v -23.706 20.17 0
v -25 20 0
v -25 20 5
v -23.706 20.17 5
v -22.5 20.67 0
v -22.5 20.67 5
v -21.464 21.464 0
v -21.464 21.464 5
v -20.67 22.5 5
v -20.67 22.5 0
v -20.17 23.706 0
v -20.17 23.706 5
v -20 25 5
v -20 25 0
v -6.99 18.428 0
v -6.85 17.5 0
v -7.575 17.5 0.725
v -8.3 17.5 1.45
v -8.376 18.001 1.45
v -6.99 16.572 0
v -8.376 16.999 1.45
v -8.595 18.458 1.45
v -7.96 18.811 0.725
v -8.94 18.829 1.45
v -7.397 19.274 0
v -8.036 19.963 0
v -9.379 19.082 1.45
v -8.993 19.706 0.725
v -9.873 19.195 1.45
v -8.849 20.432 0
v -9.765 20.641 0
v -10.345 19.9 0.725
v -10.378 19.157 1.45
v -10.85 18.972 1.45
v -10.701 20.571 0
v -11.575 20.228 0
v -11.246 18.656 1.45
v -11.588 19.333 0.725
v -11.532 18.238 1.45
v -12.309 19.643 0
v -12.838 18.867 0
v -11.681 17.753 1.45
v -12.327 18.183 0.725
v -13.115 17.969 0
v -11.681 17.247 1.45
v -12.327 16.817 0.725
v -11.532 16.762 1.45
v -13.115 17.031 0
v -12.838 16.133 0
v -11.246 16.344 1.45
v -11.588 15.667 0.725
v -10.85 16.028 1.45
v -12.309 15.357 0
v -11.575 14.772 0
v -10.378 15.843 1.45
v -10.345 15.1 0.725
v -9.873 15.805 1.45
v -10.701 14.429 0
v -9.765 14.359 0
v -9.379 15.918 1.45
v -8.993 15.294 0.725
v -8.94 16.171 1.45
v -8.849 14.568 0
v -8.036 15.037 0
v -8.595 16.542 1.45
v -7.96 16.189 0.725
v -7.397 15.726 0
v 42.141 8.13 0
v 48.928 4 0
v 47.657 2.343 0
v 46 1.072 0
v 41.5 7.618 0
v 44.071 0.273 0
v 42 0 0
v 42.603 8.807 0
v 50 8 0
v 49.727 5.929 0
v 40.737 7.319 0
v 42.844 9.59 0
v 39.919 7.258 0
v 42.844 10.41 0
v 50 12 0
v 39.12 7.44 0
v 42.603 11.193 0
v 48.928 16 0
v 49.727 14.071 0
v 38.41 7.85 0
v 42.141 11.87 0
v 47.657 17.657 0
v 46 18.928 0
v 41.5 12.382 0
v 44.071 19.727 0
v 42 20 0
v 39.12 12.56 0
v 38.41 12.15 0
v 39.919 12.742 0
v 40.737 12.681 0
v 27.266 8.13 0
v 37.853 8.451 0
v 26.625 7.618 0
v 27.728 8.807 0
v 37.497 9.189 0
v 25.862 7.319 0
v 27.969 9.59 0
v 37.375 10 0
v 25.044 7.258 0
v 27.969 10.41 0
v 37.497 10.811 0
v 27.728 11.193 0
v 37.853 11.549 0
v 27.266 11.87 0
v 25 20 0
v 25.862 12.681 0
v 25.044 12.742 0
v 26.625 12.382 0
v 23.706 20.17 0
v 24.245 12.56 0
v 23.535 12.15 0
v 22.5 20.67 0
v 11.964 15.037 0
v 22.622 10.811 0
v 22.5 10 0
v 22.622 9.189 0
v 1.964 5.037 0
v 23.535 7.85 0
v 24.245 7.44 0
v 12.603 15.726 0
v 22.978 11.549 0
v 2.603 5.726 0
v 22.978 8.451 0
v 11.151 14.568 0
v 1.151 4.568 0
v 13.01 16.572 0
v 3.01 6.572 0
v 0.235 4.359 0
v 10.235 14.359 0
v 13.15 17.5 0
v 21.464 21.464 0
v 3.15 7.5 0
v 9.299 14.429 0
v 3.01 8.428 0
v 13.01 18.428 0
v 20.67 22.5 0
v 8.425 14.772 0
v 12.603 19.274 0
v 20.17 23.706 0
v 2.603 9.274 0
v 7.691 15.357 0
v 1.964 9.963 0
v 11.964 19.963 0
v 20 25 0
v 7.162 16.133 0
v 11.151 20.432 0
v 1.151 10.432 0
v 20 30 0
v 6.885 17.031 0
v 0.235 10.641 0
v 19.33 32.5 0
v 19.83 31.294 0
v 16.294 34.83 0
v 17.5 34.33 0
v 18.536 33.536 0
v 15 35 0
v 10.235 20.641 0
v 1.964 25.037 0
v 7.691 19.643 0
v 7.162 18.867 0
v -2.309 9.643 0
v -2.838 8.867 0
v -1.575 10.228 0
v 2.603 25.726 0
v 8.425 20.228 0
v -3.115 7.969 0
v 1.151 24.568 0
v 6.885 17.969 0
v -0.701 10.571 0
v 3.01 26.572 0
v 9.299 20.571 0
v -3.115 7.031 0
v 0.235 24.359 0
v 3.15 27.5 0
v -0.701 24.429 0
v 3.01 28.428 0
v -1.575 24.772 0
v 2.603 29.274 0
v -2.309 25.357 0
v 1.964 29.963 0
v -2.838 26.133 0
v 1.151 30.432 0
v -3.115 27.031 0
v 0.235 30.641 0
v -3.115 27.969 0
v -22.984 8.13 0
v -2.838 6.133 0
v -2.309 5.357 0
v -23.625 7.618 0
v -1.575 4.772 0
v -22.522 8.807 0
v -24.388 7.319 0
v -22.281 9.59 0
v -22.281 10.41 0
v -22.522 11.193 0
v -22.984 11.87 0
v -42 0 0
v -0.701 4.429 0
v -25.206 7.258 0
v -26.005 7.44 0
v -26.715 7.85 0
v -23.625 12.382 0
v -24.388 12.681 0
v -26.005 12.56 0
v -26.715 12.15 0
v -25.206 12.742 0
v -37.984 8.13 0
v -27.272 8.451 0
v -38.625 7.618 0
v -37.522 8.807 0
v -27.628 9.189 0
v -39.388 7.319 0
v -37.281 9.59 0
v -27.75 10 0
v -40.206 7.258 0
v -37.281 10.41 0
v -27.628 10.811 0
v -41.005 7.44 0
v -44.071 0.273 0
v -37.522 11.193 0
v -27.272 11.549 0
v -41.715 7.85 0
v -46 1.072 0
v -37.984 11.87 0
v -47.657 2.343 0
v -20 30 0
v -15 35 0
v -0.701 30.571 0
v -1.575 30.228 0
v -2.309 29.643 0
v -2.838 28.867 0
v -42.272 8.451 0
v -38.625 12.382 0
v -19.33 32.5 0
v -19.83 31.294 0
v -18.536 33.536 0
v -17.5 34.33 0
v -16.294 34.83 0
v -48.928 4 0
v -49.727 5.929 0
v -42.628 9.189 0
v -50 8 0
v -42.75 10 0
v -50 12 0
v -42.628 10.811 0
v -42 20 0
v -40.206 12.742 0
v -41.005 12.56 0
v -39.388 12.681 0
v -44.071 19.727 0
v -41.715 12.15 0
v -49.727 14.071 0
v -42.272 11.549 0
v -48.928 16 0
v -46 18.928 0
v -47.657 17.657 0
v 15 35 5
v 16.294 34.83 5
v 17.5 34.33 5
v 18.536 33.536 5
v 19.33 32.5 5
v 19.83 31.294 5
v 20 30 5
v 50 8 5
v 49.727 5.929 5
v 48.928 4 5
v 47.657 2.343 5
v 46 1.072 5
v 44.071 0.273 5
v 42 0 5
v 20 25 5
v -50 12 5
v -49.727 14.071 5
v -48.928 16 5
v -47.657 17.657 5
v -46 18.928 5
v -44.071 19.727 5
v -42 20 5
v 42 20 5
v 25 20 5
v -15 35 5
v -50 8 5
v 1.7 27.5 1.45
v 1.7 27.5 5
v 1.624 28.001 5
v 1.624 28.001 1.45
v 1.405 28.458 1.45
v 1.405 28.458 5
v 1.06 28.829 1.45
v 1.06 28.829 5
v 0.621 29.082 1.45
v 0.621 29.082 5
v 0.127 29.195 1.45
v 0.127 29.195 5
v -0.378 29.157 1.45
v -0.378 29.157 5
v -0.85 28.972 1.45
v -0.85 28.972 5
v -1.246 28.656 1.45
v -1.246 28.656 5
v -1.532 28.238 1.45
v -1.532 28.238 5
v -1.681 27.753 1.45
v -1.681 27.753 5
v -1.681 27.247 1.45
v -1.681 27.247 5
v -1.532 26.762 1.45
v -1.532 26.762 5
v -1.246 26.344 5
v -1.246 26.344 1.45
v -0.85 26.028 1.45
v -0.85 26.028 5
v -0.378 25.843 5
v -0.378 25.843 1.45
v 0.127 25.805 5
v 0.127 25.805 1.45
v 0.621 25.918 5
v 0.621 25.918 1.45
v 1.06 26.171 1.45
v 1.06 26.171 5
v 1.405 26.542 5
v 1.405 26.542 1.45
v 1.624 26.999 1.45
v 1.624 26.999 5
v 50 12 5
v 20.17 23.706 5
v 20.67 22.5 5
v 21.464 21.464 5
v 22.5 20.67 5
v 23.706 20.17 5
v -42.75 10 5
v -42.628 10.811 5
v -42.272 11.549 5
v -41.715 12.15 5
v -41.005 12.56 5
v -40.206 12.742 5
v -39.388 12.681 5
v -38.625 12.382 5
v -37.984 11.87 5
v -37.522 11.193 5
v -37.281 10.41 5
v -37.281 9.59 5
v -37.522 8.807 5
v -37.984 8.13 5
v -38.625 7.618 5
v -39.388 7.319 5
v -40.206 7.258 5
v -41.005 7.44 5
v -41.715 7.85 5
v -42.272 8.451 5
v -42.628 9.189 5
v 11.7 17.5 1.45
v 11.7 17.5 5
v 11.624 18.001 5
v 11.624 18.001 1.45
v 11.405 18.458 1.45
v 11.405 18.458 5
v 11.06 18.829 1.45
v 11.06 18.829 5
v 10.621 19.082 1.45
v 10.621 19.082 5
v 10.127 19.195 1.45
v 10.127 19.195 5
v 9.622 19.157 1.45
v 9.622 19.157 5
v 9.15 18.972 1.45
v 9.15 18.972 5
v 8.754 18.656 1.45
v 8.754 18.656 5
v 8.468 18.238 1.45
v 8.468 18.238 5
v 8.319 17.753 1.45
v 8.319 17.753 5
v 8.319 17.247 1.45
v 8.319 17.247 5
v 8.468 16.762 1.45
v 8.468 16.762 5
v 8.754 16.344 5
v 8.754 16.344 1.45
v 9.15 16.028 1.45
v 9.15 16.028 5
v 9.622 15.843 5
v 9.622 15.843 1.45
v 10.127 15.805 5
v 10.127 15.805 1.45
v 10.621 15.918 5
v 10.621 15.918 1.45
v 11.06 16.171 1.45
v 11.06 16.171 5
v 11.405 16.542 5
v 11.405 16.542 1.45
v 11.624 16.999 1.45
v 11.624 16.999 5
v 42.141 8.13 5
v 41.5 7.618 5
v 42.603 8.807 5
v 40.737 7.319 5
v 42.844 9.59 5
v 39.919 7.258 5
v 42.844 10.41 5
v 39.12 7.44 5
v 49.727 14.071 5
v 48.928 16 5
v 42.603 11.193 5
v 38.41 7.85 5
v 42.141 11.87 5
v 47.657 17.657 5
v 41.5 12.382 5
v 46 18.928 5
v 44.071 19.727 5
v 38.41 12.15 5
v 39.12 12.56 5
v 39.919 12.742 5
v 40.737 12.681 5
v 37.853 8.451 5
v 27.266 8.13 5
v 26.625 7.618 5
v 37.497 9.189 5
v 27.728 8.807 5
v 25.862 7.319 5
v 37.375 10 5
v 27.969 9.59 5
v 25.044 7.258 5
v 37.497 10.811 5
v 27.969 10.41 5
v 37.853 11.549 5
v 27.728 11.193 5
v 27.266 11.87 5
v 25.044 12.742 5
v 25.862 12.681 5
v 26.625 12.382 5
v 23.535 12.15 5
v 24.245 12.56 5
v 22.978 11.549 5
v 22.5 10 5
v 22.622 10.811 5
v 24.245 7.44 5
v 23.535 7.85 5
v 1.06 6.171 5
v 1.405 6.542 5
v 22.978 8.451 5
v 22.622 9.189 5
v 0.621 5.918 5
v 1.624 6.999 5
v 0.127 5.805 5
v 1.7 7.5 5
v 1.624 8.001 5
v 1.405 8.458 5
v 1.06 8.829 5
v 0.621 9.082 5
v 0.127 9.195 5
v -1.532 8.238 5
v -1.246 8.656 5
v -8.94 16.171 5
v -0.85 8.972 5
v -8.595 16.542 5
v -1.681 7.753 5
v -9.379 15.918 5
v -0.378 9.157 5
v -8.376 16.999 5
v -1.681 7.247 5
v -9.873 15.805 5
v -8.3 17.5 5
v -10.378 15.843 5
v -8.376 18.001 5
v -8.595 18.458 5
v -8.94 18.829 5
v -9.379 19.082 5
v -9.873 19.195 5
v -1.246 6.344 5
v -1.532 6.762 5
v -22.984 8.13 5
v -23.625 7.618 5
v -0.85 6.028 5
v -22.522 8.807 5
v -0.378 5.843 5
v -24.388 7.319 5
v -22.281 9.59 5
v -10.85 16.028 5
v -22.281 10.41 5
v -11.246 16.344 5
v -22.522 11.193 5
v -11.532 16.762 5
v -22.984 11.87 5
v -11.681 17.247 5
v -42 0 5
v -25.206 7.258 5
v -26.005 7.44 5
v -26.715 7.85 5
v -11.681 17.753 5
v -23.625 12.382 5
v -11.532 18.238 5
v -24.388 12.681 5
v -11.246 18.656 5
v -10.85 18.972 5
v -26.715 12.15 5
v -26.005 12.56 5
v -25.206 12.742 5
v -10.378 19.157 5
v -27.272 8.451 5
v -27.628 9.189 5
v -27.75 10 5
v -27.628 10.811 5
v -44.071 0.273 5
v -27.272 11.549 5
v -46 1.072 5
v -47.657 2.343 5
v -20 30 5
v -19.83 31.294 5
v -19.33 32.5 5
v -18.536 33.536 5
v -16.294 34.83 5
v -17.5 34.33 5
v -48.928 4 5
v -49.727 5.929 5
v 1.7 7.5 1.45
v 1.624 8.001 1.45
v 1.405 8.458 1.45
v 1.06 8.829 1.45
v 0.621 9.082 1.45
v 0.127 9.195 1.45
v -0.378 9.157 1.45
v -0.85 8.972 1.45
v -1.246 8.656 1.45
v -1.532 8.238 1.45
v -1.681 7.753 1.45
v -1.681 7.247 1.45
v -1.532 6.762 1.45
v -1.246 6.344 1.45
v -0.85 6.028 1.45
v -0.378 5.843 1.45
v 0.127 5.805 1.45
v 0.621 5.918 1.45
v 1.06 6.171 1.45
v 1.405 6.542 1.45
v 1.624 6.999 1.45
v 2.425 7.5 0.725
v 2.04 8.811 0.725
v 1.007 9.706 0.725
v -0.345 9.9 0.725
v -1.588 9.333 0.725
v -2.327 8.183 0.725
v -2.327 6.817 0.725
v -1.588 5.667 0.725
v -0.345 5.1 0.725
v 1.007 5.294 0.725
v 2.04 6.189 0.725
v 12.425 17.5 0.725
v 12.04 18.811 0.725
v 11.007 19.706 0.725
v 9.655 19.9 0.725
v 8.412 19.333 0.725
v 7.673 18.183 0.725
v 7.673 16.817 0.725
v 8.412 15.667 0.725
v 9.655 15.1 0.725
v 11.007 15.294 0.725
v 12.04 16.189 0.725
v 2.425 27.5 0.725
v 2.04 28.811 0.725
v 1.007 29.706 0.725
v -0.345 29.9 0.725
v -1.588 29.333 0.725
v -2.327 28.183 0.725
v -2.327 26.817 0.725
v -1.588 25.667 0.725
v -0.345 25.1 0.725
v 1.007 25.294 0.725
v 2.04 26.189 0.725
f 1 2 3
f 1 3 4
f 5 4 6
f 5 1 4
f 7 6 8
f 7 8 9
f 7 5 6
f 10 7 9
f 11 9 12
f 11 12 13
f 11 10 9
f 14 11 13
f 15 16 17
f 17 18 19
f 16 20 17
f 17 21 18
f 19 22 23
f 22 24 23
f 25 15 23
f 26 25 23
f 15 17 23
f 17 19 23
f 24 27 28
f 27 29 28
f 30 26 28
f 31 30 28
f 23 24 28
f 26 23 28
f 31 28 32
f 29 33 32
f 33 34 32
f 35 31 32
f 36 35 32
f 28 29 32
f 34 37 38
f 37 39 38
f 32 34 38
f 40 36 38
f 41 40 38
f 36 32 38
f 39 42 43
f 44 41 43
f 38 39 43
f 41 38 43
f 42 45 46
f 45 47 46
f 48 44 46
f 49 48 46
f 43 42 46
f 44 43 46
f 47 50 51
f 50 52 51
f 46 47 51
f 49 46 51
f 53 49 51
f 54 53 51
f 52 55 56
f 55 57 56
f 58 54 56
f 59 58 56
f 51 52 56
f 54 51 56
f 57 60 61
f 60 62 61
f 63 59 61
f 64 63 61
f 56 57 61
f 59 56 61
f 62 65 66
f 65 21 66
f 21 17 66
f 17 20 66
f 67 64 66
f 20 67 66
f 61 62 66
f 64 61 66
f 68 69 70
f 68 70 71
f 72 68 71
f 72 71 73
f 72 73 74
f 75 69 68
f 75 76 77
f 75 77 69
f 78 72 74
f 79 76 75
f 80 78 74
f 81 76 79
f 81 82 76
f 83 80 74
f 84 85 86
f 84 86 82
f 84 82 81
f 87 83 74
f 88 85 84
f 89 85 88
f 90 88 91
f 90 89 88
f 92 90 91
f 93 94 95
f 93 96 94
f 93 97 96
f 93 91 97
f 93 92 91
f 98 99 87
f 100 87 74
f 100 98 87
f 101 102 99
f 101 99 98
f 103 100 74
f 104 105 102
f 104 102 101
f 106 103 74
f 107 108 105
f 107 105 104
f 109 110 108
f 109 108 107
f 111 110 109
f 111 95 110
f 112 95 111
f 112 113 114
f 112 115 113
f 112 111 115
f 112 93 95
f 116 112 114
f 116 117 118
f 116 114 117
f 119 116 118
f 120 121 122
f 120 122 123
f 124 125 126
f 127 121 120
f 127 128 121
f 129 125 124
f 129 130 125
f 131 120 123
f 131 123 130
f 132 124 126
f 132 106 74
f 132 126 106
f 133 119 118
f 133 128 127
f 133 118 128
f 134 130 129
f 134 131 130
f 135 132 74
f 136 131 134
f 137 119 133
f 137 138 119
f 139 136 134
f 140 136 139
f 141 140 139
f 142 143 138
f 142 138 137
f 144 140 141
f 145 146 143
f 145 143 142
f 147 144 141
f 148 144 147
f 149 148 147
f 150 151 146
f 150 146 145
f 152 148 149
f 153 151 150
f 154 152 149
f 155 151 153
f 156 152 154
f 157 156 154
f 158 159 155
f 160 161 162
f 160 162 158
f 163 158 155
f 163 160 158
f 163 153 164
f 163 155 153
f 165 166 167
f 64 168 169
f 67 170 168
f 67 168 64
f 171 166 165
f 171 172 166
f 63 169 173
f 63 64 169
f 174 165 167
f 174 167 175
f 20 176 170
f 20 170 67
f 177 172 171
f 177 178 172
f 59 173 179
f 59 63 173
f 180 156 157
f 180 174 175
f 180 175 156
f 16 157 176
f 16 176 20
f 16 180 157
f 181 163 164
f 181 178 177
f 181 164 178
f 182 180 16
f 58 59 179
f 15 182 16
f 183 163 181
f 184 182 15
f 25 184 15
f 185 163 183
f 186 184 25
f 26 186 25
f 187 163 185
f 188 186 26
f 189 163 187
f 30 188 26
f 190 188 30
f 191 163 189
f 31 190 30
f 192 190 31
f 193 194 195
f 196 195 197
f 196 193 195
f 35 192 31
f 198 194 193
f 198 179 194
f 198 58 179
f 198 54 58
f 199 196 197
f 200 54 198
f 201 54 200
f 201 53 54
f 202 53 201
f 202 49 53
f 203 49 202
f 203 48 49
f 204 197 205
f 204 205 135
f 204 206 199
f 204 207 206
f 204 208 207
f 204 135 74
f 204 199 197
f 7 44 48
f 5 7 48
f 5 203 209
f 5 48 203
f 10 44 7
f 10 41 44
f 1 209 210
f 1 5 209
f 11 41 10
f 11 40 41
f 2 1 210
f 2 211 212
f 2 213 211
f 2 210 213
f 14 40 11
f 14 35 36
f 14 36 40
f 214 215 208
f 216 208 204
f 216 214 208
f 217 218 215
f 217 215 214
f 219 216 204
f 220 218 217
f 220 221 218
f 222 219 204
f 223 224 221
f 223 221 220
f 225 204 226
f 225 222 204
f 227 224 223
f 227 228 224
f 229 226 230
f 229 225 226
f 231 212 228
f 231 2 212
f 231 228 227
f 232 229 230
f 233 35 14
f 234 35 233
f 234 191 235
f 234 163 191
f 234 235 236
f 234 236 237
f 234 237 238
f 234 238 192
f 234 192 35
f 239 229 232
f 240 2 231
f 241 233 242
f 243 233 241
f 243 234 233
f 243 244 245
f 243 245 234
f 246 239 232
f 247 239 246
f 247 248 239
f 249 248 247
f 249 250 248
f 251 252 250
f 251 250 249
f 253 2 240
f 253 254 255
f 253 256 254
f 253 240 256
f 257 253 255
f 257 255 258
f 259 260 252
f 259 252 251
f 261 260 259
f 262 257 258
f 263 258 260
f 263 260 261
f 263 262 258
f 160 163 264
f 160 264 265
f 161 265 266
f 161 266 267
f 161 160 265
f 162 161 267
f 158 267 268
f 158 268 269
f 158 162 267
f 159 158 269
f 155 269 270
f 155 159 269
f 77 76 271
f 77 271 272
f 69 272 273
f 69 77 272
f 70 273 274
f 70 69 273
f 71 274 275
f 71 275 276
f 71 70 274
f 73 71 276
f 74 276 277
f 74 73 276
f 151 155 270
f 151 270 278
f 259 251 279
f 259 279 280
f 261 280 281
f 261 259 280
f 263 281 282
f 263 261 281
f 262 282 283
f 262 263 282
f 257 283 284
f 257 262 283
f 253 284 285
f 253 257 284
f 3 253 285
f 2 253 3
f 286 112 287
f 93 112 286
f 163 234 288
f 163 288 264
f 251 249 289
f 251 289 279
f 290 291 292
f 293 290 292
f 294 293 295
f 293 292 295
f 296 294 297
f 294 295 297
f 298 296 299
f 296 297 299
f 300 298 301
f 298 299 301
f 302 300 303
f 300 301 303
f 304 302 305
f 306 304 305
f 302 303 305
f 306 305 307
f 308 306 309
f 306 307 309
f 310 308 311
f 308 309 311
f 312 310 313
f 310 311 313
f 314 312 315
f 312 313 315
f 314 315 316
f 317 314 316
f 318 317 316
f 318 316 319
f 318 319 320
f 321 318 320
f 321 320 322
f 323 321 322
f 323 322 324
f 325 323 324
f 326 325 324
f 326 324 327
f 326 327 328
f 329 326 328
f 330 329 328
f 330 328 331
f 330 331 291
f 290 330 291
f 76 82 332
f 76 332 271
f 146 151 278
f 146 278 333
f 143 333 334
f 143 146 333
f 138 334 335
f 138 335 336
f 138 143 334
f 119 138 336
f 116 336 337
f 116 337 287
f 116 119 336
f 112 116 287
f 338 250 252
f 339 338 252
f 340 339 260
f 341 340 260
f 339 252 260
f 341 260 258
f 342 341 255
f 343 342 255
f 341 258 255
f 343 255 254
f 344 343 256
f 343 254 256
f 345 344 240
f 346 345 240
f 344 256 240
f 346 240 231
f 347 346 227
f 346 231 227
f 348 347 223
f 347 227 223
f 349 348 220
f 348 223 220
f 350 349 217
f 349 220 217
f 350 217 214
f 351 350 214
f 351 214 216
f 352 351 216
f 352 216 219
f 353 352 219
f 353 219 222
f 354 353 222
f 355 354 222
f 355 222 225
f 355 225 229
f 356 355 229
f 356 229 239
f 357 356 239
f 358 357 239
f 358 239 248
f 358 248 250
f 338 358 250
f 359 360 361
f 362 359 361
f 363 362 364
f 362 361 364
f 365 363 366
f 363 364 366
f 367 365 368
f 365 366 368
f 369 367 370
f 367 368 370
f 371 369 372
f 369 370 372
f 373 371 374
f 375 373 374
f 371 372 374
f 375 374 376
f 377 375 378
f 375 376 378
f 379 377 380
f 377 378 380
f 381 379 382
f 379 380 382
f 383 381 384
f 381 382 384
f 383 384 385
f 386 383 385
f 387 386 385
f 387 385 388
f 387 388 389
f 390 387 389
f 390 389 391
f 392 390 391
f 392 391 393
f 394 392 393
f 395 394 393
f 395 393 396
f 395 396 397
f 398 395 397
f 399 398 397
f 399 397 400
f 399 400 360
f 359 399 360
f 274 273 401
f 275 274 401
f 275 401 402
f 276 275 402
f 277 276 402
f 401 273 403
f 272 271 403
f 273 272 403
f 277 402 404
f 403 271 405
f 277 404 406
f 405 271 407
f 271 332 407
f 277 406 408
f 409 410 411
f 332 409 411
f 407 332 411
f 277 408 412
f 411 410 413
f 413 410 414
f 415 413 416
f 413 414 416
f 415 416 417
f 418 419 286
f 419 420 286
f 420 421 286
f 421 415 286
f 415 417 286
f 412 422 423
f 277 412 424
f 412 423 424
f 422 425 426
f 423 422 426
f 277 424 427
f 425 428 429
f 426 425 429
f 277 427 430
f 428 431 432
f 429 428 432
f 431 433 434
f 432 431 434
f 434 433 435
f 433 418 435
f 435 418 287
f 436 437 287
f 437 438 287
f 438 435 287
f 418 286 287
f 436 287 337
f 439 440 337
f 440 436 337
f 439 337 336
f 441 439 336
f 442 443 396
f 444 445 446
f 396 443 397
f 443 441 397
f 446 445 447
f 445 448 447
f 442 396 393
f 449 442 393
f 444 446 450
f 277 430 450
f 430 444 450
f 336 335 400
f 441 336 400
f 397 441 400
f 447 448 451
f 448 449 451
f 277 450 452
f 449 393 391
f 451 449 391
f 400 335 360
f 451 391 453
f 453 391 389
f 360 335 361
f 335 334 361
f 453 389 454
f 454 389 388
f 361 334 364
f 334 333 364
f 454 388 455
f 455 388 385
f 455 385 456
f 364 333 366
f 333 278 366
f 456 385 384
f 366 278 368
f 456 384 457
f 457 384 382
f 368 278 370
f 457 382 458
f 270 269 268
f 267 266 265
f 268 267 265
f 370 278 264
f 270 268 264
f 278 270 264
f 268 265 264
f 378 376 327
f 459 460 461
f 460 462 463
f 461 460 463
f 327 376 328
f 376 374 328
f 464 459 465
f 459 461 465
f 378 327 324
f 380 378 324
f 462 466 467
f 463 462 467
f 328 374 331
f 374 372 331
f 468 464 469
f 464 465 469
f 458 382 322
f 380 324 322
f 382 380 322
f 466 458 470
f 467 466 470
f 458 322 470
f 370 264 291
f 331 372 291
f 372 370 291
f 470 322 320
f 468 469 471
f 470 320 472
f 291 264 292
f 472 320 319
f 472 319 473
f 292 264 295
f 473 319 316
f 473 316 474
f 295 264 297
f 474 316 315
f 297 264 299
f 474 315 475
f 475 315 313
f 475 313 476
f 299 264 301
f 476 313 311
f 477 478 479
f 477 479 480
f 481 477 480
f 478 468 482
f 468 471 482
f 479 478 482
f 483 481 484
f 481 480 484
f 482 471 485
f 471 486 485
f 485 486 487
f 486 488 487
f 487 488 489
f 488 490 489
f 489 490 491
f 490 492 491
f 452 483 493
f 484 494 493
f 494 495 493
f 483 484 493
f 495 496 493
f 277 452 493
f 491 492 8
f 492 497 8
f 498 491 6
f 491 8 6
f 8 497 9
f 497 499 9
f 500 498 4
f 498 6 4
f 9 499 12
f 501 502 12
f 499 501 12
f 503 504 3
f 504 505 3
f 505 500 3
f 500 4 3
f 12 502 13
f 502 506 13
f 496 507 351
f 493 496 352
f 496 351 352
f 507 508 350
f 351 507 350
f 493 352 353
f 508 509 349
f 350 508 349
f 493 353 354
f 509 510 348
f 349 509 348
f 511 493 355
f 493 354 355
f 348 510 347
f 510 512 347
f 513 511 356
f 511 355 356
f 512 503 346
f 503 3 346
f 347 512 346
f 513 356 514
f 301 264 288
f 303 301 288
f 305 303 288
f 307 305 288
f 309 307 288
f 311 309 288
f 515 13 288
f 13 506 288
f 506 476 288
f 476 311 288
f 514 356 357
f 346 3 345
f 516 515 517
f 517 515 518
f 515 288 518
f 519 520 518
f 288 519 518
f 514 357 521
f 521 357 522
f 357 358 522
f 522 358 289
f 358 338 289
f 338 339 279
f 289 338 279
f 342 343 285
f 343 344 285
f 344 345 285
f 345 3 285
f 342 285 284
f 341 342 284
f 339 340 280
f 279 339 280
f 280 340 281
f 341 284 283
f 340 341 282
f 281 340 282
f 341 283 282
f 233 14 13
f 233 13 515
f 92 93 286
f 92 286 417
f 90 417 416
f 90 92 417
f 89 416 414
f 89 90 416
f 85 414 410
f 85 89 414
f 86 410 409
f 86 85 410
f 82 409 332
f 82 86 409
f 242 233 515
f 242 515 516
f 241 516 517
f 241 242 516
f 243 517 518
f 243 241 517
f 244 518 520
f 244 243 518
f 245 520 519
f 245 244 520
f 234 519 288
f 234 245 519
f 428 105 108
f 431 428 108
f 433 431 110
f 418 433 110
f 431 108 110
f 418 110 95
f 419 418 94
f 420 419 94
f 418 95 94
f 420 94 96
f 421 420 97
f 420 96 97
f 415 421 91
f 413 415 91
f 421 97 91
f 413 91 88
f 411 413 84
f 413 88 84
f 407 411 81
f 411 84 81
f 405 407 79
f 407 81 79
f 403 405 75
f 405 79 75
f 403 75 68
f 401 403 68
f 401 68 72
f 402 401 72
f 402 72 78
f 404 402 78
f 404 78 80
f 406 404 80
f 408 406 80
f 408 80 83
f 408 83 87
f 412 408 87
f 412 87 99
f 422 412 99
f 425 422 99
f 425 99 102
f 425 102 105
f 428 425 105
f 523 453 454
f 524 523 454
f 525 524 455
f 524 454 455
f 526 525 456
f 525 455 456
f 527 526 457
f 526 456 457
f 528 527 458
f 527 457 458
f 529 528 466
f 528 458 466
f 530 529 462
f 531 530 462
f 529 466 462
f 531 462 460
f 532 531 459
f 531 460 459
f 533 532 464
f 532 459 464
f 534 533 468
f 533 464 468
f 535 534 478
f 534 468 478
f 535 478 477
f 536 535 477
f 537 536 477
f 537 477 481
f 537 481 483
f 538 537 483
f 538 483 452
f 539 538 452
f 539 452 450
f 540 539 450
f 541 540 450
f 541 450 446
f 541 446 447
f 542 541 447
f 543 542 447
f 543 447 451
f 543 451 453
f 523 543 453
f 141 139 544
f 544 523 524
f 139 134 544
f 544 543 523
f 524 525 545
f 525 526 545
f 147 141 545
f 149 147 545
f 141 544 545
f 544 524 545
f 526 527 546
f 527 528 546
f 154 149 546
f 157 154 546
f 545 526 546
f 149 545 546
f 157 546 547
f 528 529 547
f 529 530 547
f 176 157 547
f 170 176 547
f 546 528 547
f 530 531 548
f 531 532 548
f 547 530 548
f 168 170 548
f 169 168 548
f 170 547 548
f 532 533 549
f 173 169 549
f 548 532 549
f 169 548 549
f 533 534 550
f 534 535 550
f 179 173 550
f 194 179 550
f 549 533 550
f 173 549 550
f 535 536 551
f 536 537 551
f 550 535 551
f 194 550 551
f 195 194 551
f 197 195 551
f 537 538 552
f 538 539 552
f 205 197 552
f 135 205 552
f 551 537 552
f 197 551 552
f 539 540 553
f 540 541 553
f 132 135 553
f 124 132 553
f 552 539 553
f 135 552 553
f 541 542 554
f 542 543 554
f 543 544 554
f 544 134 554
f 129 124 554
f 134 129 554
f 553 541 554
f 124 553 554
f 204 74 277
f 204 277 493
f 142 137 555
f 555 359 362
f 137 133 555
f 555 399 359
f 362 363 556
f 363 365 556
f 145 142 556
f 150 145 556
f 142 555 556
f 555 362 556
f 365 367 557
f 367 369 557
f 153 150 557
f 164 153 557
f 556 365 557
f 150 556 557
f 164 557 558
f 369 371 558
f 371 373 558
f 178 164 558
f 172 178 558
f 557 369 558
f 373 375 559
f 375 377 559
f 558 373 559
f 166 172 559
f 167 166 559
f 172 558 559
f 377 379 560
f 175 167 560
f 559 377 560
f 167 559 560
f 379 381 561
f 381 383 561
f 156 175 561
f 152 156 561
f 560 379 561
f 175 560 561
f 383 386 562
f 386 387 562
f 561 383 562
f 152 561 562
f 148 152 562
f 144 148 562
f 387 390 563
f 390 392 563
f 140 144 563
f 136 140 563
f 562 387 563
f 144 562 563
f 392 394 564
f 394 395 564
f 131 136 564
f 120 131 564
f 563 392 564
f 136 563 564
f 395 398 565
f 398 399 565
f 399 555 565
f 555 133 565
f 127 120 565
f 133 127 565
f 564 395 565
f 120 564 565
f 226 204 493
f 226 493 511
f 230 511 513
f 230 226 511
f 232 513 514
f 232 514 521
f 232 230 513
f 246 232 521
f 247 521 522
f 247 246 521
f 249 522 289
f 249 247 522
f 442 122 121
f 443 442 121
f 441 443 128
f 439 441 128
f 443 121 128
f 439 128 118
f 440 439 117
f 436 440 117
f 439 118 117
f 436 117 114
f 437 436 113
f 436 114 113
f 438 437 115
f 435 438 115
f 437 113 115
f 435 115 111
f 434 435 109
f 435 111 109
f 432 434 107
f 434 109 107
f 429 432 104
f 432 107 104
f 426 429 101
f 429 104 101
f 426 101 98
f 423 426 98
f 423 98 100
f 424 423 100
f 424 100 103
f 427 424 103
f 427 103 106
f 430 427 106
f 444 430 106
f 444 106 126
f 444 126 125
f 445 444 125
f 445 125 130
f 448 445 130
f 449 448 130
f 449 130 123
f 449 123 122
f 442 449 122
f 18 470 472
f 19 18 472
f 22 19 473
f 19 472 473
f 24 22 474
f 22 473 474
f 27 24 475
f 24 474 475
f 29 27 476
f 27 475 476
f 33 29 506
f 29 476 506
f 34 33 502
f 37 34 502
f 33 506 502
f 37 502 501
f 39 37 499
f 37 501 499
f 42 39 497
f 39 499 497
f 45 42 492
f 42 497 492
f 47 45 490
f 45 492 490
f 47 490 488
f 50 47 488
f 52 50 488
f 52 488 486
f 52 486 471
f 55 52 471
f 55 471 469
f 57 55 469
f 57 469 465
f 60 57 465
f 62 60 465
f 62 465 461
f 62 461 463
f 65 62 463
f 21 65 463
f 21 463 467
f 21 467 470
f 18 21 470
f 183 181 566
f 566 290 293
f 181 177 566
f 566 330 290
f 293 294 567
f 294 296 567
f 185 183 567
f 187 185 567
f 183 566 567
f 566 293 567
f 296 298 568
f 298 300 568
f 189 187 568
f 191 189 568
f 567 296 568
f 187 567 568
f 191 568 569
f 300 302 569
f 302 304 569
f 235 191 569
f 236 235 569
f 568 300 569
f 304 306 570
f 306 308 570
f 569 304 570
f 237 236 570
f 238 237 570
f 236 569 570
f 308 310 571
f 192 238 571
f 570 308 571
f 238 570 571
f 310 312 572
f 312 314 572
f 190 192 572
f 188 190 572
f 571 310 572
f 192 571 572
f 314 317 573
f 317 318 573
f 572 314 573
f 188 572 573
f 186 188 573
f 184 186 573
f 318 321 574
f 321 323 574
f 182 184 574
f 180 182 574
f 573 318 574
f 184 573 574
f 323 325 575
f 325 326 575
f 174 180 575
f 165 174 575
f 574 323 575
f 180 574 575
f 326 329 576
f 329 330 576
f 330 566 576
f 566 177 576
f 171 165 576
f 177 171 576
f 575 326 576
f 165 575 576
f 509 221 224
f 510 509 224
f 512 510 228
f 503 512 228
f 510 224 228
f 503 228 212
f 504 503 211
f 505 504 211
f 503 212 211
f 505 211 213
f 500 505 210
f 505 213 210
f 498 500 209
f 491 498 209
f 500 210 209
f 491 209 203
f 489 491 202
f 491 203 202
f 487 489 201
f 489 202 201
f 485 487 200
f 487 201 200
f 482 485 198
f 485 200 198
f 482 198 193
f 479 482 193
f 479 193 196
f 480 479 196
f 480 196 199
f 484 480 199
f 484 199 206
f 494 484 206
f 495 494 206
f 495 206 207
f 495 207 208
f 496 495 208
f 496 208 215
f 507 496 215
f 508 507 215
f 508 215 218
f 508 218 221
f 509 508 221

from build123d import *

# Parameters (mm, degrees)
BOSS_EXTRUDE1_DEPTH                             = 5
M5_CLEARANCE_HOLE1_D                            = 5.5
M5_CLEARANCE_HOLE1_DEPTH                        = 5
CSK_FOR_M3_FLAT_HEAD_MACHINE_SCREW1_D           = 3.4
CSK_FOR_M3_FLAT_HEAD_MACHINE_SCREW1_DEPTH       = 5
CSK_FOR_M3_FLAT_HEAD_MACHINE_SCREW1_CSINK_D     = 6.3
CSK_FOR_M3_FLAT_HEAD_MACHINE_SCREW1_CSINK_ANGLE = 90


with BuildPart() as part:
    # Sketch1 → Boss-Extrude1 (new body)
    with BuildSketch(Plane.XY):
        with BuildLine():
            Line((42, 0), (-42, 0))
            ThreePointArc((-42, 0), (-47.656854249, 2.343145751), (-50, 8))
            Line((-50, 8), (-50, 12))
            ThreePointArc((-50, 12), (-47.656854249, 17.656854249), (-42, 20))
            Line((-42, 20), (-25, 20))
            ThreePointArc((-25, 20), (-21.464466094, 21.464466094), (-20, 25))
            Line((-20, 25), (-20, 30))
            ThreePointArc((-20, 30), (-18.535533906, 33.535533906), (-15, 35))
            Line((-15, 35), (15, 35))
            ThreePointArc((15, 35), (18.535533906, 33.535533906), (20, 30))
            Line((20, 30), (20, 25))
            ThreePointArc((20, 25), (21.464466094, 21.464466094), (25, 20))
            Line((25, 20), (42, 20))
            ThreePointArc((42, 20), (47.656854249, 17.656854249), (50, 12))
            Line((50, 12), (50, 8))
            ThreePointArc((50, 8), (47.656854249, 2.343145751), (42, 0))
        make_face()
    extrude(amount=BOSS_EXTRUDE1_DEPTH)

    # M5 Clearance Hole1
    with Locations(Plane.XY.offset(5)):
        with Locations((-40, 10), (-25, 10), (25.25, 10), (40.125, 10)):
            Hole(M5_CLEARANCE_HOLE1_D / 2, depth=M5_CLEARANCE_HOLE1_DEPTH)

    # CSK for M3 Flat Head Machine Screw1
    with Locations(Plane(origin=(0, 0, 0), x_dir=(-1, 0, 0), z_dir=(0, 0, -1))):
        with Locations((-10, 17.5), (0, 7.5), (10, 17.5), (0, 27.5)):
            CounterSinkHole(CSK_FOR_M3_FLAT_HEAD_MACHINE_SCREW1_D / 2, CSK_FOR_M3_FLAT_HEAD_MACHINE_SCREW1_CSINK_D / 2, depth=CSK_FOR_M3_FLAT_HEAD_MACHINE_SCREW1_DEPTH, counter_sink_angle=CSK_FOR_M3_FLAT_HEAD_MACHINE_SCREW1_CSINK_ANGLE)


solid = part.part
